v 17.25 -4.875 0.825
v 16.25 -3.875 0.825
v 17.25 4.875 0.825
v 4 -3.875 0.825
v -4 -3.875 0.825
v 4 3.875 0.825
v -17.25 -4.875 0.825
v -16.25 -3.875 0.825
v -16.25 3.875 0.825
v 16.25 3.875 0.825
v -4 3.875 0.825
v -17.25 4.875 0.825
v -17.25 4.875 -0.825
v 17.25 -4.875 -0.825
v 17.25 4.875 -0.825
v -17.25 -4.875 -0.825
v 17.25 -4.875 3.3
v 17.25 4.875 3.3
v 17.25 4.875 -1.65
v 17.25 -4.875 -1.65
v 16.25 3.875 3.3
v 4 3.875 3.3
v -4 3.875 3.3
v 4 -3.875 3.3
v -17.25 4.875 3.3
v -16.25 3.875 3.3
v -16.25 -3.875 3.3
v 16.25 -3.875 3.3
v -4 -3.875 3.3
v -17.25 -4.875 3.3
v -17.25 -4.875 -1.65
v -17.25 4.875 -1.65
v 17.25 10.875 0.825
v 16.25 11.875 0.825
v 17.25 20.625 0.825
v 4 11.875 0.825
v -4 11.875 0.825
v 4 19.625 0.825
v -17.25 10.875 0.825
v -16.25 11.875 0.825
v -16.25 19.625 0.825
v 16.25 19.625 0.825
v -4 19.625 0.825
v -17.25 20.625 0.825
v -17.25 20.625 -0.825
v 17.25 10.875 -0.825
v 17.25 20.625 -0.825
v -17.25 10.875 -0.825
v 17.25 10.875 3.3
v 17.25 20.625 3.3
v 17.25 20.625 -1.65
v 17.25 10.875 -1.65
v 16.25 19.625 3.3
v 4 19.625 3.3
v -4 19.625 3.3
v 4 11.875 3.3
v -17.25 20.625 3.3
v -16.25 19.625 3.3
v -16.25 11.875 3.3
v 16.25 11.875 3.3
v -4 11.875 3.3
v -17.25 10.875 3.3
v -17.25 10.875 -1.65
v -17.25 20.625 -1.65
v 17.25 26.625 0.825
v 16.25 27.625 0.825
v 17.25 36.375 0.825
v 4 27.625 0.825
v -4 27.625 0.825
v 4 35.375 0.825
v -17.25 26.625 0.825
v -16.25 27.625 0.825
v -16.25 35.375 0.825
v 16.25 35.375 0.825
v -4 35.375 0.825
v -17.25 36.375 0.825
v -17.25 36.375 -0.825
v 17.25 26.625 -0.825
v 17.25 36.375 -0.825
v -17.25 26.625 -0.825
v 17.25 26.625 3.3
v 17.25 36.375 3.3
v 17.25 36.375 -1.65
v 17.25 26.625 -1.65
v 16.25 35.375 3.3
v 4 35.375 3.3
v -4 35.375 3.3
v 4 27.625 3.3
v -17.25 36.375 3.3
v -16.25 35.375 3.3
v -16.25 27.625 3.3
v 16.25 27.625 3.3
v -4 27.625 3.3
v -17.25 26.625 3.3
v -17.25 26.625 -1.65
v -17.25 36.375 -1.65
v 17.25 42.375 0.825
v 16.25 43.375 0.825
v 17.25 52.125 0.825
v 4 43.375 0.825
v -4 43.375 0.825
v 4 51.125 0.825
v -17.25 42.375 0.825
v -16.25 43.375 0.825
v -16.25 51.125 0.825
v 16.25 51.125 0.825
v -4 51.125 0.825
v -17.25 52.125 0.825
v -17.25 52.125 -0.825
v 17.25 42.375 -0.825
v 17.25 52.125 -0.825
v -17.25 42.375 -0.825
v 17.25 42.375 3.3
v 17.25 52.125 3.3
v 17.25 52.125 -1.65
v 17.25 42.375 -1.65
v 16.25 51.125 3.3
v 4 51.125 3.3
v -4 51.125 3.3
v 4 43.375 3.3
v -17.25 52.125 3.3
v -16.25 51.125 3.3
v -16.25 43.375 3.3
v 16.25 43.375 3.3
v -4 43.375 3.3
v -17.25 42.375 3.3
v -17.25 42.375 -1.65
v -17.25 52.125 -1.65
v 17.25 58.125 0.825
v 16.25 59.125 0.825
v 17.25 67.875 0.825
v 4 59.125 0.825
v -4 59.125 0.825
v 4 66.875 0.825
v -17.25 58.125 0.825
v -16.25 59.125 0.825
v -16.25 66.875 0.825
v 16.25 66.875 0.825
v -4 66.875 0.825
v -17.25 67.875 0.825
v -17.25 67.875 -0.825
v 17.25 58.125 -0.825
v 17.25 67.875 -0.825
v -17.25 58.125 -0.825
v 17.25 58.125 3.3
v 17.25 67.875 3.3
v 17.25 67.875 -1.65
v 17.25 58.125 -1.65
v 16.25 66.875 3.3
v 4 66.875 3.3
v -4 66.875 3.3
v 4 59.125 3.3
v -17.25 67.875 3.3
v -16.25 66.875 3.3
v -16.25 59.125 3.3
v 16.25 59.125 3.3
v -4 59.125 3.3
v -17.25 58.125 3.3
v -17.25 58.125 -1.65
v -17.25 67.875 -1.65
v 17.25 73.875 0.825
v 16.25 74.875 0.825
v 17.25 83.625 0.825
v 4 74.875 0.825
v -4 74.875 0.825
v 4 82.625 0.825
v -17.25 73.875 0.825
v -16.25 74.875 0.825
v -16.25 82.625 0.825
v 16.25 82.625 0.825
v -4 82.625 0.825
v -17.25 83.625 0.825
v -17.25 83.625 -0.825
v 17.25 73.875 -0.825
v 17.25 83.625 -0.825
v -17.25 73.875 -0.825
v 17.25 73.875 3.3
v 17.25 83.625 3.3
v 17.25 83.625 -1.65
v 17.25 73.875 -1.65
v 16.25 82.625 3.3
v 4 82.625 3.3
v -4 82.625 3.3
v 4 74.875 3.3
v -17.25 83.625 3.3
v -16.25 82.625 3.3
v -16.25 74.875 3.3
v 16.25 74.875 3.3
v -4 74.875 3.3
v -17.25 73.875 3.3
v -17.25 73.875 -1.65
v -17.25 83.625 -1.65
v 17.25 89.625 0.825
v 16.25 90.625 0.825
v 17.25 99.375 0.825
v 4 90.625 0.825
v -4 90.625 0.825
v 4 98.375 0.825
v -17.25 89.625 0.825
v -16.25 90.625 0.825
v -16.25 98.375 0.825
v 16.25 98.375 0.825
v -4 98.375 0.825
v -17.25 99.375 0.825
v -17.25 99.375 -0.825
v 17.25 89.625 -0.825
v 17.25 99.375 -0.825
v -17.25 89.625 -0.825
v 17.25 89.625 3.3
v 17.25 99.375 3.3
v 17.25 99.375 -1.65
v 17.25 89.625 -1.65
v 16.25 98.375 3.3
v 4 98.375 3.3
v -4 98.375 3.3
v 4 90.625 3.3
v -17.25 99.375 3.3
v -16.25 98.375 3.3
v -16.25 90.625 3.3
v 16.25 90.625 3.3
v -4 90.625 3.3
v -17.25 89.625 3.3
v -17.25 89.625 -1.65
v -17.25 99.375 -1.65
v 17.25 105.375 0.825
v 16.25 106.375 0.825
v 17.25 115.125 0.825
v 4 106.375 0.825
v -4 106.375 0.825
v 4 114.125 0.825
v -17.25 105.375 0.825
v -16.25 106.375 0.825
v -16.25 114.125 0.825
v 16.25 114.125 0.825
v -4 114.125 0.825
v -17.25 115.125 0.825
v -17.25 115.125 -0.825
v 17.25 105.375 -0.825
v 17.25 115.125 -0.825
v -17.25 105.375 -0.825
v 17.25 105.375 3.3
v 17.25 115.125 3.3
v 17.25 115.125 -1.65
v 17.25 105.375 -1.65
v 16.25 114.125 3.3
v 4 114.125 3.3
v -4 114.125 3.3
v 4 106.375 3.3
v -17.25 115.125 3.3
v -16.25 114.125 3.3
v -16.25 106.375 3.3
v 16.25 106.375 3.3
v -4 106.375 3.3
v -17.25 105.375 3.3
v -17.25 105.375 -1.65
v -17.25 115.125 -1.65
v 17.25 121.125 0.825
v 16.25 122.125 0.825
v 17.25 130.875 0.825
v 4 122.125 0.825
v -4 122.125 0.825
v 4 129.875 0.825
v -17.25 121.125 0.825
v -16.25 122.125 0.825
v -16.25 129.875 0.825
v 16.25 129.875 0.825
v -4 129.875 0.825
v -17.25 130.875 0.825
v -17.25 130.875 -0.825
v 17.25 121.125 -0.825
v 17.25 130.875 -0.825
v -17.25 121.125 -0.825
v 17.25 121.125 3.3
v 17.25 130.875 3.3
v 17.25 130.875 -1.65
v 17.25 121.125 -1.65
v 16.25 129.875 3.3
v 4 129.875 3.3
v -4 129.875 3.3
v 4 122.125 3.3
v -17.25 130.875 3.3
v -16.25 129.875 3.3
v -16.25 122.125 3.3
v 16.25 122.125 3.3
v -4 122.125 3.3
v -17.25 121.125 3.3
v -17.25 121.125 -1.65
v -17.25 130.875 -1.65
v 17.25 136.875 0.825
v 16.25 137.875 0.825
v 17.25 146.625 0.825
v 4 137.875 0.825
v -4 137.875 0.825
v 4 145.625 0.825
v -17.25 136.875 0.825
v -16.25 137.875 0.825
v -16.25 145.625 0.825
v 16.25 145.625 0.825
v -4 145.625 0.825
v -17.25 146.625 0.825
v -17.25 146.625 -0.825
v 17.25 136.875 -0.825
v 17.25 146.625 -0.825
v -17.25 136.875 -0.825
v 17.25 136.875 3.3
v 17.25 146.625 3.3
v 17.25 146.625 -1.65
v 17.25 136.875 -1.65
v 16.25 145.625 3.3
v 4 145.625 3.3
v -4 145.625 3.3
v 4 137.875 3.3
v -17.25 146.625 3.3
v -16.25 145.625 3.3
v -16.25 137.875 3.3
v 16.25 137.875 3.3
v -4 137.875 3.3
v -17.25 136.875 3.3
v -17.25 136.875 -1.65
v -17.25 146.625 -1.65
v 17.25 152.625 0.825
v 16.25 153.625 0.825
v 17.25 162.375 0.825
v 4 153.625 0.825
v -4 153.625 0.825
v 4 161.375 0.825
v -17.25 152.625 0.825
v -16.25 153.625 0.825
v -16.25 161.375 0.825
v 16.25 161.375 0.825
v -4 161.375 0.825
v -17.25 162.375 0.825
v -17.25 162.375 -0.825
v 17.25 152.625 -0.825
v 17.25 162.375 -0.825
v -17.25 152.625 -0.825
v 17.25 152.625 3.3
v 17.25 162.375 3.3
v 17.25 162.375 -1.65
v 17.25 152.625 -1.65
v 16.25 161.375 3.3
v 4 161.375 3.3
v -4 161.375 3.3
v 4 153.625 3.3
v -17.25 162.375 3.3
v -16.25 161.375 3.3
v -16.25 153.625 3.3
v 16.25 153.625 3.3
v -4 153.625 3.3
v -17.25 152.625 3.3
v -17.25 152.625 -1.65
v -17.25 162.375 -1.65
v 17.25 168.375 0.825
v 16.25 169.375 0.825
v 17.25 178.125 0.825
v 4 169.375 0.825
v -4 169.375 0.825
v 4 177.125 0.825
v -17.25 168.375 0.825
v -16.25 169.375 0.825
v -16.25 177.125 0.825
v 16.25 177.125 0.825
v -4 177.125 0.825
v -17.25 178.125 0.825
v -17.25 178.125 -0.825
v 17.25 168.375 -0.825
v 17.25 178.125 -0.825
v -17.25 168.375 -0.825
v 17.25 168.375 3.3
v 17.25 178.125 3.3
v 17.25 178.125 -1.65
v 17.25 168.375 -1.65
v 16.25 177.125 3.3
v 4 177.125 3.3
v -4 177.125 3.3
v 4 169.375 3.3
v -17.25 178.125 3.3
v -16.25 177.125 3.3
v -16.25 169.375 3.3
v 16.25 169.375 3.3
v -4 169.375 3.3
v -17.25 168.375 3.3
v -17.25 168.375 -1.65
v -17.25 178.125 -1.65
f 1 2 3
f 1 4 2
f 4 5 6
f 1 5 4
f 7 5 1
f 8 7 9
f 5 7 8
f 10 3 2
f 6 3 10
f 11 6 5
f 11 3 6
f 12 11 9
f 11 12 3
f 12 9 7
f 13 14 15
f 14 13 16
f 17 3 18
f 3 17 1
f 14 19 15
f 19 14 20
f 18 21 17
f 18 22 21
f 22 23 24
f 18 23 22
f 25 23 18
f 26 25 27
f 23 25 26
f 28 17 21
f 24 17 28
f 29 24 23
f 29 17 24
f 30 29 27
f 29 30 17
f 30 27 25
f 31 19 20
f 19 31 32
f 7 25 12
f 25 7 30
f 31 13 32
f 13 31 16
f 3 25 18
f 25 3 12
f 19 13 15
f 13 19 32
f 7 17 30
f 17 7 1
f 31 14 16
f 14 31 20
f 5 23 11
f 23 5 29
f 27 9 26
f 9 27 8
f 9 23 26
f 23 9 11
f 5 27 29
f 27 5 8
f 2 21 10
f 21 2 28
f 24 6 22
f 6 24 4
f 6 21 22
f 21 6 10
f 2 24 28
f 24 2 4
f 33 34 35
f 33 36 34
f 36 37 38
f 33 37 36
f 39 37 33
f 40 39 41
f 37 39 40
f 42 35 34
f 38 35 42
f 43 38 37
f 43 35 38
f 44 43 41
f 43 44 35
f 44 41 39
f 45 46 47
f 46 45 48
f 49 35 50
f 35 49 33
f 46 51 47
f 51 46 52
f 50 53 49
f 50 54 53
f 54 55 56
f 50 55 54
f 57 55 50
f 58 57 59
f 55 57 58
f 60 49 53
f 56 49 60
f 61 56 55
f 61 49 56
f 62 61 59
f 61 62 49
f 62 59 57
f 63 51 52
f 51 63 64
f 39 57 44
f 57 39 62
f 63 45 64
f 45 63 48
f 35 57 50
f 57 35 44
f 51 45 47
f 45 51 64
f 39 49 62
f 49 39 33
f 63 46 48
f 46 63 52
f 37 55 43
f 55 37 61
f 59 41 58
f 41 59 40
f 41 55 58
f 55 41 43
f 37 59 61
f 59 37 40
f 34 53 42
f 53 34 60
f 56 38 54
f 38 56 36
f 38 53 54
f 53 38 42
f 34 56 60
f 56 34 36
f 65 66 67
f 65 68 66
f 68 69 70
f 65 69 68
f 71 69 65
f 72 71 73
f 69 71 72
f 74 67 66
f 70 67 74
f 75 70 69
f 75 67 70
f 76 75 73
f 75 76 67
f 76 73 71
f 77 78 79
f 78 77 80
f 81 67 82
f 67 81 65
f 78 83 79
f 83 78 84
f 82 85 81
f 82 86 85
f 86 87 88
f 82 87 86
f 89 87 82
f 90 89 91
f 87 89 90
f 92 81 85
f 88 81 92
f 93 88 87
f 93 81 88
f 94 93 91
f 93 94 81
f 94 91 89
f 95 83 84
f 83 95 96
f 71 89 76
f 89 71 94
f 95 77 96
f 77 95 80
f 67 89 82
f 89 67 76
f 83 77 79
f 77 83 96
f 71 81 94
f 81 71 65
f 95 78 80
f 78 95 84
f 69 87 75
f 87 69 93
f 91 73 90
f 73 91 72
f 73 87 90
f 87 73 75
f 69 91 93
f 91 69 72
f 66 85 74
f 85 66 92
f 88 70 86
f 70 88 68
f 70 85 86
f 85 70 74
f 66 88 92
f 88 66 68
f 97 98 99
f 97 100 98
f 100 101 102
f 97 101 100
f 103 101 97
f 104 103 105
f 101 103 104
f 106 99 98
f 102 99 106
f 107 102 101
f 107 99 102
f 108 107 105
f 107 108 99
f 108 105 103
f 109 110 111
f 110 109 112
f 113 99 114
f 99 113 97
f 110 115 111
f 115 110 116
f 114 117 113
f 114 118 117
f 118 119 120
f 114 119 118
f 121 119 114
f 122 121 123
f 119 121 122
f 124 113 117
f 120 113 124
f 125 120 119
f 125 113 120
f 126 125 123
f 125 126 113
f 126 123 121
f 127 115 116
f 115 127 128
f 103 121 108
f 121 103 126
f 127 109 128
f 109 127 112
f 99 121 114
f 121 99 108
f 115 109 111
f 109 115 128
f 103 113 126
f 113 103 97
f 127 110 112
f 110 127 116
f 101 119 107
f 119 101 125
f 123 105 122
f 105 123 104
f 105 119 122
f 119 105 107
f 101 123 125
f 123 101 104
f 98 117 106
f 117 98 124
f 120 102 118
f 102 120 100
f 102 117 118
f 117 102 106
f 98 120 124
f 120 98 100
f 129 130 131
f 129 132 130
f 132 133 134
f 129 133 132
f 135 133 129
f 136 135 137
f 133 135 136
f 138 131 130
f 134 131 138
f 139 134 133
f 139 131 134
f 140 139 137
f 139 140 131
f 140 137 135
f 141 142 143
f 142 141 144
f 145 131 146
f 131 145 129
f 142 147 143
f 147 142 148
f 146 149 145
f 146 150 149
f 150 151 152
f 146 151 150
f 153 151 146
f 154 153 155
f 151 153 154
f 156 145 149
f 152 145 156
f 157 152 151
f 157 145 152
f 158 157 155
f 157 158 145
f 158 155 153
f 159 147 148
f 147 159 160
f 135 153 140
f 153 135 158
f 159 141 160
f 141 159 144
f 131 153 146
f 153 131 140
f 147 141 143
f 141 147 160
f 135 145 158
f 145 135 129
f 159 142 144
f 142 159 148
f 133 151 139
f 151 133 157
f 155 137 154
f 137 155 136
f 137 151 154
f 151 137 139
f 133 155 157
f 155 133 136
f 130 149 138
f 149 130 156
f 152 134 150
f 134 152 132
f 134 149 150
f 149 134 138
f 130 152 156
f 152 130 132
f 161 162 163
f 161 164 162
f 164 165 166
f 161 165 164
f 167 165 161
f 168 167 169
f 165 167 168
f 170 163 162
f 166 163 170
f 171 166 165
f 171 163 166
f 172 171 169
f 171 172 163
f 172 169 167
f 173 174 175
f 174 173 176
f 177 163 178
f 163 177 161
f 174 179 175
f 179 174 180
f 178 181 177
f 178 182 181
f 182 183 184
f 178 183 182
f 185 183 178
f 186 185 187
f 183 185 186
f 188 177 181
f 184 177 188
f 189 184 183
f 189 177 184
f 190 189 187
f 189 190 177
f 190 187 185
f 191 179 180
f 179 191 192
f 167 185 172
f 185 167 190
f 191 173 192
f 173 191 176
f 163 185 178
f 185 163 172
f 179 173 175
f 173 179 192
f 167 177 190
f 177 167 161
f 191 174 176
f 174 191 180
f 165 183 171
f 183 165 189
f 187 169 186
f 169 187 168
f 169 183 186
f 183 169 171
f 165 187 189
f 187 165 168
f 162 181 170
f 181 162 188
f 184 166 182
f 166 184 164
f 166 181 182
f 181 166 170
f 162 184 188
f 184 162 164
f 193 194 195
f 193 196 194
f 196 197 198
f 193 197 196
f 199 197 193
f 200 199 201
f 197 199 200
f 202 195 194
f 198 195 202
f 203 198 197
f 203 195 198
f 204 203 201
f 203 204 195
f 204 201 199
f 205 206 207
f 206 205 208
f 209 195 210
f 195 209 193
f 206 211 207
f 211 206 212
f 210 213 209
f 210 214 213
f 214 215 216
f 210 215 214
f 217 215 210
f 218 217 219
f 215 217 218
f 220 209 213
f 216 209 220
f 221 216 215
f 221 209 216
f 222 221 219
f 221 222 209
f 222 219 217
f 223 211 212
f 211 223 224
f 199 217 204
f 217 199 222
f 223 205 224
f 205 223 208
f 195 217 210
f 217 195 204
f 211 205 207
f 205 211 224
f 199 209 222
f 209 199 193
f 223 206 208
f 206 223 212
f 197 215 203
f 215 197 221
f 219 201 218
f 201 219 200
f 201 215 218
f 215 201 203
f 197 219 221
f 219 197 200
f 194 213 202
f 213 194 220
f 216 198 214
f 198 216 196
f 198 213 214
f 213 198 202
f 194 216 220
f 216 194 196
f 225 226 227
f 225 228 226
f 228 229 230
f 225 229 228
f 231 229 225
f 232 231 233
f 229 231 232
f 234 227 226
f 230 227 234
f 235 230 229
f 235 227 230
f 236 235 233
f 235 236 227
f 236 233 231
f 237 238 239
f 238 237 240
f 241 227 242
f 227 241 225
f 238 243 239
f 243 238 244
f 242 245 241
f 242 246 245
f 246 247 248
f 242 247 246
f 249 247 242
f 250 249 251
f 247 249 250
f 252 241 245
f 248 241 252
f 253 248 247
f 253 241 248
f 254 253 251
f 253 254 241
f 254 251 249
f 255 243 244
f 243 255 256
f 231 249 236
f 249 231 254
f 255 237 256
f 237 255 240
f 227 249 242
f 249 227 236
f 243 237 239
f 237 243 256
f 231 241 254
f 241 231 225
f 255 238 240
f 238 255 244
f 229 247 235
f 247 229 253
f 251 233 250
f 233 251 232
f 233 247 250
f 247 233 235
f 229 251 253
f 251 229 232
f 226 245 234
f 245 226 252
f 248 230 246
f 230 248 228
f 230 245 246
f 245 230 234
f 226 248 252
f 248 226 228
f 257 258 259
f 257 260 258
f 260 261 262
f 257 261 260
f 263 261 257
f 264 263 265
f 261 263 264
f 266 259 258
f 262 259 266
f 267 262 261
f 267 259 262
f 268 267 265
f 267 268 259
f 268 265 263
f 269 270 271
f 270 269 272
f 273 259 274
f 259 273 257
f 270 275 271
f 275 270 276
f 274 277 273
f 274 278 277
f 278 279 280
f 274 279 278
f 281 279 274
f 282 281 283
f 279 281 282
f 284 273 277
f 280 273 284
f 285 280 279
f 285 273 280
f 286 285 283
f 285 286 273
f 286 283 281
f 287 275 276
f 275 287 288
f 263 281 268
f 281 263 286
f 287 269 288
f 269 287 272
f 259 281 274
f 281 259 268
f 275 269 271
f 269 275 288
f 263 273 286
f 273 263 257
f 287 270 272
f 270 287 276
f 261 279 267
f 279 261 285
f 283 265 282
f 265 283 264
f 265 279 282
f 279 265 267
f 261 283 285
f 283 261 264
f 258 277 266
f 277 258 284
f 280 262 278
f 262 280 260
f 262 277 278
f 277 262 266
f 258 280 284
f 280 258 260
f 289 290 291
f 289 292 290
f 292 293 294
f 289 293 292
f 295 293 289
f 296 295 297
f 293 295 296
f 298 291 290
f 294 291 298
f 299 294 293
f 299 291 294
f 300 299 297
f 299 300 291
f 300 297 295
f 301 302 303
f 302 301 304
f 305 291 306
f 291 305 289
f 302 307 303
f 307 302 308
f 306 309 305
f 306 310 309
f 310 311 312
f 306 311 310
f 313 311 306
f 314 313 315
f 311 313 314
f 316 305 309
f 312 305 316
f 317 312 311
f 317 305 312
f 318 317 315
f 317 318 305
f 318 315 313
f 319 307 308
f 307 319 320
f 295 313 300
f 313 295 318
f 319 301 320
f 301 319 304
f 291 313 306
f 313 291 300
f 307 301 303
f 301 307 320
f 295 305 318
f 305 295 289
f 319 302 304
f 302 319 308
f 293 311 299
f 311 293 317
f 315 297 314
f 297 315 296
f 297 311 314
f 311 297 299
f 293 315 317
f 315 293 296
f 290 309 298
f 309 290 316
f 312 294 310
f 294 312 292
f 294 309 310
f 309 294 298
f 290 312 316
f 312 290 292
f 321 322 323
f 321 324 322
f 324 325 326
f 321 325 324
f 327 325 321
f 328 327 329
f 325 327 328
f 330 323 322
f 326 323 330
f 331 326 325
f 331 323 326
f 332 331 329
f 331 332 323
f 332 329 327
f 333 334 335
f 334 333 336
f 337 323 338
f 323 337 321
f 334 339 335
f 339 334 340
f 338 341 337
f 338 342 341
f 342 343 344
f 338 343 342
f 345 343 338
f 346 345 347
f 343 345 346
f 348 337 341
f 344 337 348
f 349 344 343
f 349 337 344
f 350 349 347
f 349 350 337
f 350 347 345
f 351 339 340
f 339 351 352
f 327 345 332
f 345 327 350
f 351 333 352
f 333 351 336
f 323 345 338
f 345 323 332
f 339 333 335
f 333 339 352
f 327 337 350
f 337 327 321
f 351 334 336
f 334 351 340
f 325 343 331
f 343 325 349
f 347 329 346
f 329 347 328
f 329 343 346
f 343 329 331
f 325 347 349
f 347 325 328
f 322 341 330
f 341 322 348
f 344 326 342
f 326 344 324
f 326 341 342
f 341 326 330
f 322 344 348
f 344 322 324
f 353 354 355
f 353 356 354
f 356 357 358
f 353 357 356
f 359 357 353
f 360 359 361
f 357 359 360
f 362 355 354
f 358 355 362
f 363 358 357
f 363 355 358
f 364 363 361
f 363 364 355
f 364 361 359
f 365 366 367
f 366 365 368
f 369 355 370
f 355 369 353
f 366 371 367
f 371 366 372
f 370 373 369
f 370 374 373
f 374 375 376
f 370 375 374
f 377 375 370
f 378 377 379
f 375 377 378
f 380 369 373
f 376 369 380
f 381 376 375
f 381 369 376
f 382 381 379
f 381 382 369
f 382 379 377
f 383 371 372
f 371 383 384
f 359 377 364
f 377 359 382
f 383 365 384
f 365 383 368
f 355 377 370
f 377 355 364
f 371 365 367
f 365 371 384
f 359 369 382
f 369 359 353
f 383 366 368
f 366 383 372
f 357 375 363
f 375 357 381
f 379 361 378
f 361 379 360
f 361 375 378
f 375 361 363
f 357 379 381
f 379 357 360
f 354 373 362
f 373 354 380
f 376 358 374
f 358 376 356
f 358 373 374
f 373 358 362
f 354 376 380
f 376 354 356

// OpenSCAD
$footW = 24.5;
$footH = 15.5;
$spacer = 16;
$depth = 5;
$rim = 2;
$blockW = $footW * 2 + $spacer*2;
$blockL = $footH + $spacer;

module footplate() {
    difference() {
        union() {
        cube([$blockW, $blockL, $depth], true);
        translate([0, 0, $depth/2]) { 
            cube([$footW*2+$spacer + $rim*2, 
            $footH+$rim*2, $depth*3], true);
        }
        }
        translate([-($footW + $spacer/2), 
                   -$footH/2, 0]) {
            cube([$footW, $footH, 30], false);
        }
        translate([$spacer / 2, -$footH/2, 0]) {
            cube([$footW, $footH, 30], false);
        }
        cube([$blockW, $blockL, $depth], true);
    }
    
}

scale([.5, .5, .33]) {
union() {
    for (i = [0:11]) {
        translate([0, $blockL * i, 0]) {
            footplate();
         /*   difference() {
                union() {
                cube([$blockW, $blockL, $depth], true);
                if (i < 11) {
                translate([0, 0, $depth/2]) { 
                    cube([$spacer, 
                    $blockL, $depth*2], true);
                }
                translate([0, 0, $depth/2]) { 
                    cube([$footW*2+$spacer + $rim*2, 
                    $footH+$rim*2, $depth*2], true);
                }
                }
                }
                translate([-($footW + $spacer/2), -$footH/2, 0]) 
                {
                    cube([$footW, $footH, 30], false);
                }
                translate([$spacer / 2, -$footH/2, 0]) {
                    cube([$footW, $footH, 30], false);
                }
            }*/
        }
        
    }
}
}
